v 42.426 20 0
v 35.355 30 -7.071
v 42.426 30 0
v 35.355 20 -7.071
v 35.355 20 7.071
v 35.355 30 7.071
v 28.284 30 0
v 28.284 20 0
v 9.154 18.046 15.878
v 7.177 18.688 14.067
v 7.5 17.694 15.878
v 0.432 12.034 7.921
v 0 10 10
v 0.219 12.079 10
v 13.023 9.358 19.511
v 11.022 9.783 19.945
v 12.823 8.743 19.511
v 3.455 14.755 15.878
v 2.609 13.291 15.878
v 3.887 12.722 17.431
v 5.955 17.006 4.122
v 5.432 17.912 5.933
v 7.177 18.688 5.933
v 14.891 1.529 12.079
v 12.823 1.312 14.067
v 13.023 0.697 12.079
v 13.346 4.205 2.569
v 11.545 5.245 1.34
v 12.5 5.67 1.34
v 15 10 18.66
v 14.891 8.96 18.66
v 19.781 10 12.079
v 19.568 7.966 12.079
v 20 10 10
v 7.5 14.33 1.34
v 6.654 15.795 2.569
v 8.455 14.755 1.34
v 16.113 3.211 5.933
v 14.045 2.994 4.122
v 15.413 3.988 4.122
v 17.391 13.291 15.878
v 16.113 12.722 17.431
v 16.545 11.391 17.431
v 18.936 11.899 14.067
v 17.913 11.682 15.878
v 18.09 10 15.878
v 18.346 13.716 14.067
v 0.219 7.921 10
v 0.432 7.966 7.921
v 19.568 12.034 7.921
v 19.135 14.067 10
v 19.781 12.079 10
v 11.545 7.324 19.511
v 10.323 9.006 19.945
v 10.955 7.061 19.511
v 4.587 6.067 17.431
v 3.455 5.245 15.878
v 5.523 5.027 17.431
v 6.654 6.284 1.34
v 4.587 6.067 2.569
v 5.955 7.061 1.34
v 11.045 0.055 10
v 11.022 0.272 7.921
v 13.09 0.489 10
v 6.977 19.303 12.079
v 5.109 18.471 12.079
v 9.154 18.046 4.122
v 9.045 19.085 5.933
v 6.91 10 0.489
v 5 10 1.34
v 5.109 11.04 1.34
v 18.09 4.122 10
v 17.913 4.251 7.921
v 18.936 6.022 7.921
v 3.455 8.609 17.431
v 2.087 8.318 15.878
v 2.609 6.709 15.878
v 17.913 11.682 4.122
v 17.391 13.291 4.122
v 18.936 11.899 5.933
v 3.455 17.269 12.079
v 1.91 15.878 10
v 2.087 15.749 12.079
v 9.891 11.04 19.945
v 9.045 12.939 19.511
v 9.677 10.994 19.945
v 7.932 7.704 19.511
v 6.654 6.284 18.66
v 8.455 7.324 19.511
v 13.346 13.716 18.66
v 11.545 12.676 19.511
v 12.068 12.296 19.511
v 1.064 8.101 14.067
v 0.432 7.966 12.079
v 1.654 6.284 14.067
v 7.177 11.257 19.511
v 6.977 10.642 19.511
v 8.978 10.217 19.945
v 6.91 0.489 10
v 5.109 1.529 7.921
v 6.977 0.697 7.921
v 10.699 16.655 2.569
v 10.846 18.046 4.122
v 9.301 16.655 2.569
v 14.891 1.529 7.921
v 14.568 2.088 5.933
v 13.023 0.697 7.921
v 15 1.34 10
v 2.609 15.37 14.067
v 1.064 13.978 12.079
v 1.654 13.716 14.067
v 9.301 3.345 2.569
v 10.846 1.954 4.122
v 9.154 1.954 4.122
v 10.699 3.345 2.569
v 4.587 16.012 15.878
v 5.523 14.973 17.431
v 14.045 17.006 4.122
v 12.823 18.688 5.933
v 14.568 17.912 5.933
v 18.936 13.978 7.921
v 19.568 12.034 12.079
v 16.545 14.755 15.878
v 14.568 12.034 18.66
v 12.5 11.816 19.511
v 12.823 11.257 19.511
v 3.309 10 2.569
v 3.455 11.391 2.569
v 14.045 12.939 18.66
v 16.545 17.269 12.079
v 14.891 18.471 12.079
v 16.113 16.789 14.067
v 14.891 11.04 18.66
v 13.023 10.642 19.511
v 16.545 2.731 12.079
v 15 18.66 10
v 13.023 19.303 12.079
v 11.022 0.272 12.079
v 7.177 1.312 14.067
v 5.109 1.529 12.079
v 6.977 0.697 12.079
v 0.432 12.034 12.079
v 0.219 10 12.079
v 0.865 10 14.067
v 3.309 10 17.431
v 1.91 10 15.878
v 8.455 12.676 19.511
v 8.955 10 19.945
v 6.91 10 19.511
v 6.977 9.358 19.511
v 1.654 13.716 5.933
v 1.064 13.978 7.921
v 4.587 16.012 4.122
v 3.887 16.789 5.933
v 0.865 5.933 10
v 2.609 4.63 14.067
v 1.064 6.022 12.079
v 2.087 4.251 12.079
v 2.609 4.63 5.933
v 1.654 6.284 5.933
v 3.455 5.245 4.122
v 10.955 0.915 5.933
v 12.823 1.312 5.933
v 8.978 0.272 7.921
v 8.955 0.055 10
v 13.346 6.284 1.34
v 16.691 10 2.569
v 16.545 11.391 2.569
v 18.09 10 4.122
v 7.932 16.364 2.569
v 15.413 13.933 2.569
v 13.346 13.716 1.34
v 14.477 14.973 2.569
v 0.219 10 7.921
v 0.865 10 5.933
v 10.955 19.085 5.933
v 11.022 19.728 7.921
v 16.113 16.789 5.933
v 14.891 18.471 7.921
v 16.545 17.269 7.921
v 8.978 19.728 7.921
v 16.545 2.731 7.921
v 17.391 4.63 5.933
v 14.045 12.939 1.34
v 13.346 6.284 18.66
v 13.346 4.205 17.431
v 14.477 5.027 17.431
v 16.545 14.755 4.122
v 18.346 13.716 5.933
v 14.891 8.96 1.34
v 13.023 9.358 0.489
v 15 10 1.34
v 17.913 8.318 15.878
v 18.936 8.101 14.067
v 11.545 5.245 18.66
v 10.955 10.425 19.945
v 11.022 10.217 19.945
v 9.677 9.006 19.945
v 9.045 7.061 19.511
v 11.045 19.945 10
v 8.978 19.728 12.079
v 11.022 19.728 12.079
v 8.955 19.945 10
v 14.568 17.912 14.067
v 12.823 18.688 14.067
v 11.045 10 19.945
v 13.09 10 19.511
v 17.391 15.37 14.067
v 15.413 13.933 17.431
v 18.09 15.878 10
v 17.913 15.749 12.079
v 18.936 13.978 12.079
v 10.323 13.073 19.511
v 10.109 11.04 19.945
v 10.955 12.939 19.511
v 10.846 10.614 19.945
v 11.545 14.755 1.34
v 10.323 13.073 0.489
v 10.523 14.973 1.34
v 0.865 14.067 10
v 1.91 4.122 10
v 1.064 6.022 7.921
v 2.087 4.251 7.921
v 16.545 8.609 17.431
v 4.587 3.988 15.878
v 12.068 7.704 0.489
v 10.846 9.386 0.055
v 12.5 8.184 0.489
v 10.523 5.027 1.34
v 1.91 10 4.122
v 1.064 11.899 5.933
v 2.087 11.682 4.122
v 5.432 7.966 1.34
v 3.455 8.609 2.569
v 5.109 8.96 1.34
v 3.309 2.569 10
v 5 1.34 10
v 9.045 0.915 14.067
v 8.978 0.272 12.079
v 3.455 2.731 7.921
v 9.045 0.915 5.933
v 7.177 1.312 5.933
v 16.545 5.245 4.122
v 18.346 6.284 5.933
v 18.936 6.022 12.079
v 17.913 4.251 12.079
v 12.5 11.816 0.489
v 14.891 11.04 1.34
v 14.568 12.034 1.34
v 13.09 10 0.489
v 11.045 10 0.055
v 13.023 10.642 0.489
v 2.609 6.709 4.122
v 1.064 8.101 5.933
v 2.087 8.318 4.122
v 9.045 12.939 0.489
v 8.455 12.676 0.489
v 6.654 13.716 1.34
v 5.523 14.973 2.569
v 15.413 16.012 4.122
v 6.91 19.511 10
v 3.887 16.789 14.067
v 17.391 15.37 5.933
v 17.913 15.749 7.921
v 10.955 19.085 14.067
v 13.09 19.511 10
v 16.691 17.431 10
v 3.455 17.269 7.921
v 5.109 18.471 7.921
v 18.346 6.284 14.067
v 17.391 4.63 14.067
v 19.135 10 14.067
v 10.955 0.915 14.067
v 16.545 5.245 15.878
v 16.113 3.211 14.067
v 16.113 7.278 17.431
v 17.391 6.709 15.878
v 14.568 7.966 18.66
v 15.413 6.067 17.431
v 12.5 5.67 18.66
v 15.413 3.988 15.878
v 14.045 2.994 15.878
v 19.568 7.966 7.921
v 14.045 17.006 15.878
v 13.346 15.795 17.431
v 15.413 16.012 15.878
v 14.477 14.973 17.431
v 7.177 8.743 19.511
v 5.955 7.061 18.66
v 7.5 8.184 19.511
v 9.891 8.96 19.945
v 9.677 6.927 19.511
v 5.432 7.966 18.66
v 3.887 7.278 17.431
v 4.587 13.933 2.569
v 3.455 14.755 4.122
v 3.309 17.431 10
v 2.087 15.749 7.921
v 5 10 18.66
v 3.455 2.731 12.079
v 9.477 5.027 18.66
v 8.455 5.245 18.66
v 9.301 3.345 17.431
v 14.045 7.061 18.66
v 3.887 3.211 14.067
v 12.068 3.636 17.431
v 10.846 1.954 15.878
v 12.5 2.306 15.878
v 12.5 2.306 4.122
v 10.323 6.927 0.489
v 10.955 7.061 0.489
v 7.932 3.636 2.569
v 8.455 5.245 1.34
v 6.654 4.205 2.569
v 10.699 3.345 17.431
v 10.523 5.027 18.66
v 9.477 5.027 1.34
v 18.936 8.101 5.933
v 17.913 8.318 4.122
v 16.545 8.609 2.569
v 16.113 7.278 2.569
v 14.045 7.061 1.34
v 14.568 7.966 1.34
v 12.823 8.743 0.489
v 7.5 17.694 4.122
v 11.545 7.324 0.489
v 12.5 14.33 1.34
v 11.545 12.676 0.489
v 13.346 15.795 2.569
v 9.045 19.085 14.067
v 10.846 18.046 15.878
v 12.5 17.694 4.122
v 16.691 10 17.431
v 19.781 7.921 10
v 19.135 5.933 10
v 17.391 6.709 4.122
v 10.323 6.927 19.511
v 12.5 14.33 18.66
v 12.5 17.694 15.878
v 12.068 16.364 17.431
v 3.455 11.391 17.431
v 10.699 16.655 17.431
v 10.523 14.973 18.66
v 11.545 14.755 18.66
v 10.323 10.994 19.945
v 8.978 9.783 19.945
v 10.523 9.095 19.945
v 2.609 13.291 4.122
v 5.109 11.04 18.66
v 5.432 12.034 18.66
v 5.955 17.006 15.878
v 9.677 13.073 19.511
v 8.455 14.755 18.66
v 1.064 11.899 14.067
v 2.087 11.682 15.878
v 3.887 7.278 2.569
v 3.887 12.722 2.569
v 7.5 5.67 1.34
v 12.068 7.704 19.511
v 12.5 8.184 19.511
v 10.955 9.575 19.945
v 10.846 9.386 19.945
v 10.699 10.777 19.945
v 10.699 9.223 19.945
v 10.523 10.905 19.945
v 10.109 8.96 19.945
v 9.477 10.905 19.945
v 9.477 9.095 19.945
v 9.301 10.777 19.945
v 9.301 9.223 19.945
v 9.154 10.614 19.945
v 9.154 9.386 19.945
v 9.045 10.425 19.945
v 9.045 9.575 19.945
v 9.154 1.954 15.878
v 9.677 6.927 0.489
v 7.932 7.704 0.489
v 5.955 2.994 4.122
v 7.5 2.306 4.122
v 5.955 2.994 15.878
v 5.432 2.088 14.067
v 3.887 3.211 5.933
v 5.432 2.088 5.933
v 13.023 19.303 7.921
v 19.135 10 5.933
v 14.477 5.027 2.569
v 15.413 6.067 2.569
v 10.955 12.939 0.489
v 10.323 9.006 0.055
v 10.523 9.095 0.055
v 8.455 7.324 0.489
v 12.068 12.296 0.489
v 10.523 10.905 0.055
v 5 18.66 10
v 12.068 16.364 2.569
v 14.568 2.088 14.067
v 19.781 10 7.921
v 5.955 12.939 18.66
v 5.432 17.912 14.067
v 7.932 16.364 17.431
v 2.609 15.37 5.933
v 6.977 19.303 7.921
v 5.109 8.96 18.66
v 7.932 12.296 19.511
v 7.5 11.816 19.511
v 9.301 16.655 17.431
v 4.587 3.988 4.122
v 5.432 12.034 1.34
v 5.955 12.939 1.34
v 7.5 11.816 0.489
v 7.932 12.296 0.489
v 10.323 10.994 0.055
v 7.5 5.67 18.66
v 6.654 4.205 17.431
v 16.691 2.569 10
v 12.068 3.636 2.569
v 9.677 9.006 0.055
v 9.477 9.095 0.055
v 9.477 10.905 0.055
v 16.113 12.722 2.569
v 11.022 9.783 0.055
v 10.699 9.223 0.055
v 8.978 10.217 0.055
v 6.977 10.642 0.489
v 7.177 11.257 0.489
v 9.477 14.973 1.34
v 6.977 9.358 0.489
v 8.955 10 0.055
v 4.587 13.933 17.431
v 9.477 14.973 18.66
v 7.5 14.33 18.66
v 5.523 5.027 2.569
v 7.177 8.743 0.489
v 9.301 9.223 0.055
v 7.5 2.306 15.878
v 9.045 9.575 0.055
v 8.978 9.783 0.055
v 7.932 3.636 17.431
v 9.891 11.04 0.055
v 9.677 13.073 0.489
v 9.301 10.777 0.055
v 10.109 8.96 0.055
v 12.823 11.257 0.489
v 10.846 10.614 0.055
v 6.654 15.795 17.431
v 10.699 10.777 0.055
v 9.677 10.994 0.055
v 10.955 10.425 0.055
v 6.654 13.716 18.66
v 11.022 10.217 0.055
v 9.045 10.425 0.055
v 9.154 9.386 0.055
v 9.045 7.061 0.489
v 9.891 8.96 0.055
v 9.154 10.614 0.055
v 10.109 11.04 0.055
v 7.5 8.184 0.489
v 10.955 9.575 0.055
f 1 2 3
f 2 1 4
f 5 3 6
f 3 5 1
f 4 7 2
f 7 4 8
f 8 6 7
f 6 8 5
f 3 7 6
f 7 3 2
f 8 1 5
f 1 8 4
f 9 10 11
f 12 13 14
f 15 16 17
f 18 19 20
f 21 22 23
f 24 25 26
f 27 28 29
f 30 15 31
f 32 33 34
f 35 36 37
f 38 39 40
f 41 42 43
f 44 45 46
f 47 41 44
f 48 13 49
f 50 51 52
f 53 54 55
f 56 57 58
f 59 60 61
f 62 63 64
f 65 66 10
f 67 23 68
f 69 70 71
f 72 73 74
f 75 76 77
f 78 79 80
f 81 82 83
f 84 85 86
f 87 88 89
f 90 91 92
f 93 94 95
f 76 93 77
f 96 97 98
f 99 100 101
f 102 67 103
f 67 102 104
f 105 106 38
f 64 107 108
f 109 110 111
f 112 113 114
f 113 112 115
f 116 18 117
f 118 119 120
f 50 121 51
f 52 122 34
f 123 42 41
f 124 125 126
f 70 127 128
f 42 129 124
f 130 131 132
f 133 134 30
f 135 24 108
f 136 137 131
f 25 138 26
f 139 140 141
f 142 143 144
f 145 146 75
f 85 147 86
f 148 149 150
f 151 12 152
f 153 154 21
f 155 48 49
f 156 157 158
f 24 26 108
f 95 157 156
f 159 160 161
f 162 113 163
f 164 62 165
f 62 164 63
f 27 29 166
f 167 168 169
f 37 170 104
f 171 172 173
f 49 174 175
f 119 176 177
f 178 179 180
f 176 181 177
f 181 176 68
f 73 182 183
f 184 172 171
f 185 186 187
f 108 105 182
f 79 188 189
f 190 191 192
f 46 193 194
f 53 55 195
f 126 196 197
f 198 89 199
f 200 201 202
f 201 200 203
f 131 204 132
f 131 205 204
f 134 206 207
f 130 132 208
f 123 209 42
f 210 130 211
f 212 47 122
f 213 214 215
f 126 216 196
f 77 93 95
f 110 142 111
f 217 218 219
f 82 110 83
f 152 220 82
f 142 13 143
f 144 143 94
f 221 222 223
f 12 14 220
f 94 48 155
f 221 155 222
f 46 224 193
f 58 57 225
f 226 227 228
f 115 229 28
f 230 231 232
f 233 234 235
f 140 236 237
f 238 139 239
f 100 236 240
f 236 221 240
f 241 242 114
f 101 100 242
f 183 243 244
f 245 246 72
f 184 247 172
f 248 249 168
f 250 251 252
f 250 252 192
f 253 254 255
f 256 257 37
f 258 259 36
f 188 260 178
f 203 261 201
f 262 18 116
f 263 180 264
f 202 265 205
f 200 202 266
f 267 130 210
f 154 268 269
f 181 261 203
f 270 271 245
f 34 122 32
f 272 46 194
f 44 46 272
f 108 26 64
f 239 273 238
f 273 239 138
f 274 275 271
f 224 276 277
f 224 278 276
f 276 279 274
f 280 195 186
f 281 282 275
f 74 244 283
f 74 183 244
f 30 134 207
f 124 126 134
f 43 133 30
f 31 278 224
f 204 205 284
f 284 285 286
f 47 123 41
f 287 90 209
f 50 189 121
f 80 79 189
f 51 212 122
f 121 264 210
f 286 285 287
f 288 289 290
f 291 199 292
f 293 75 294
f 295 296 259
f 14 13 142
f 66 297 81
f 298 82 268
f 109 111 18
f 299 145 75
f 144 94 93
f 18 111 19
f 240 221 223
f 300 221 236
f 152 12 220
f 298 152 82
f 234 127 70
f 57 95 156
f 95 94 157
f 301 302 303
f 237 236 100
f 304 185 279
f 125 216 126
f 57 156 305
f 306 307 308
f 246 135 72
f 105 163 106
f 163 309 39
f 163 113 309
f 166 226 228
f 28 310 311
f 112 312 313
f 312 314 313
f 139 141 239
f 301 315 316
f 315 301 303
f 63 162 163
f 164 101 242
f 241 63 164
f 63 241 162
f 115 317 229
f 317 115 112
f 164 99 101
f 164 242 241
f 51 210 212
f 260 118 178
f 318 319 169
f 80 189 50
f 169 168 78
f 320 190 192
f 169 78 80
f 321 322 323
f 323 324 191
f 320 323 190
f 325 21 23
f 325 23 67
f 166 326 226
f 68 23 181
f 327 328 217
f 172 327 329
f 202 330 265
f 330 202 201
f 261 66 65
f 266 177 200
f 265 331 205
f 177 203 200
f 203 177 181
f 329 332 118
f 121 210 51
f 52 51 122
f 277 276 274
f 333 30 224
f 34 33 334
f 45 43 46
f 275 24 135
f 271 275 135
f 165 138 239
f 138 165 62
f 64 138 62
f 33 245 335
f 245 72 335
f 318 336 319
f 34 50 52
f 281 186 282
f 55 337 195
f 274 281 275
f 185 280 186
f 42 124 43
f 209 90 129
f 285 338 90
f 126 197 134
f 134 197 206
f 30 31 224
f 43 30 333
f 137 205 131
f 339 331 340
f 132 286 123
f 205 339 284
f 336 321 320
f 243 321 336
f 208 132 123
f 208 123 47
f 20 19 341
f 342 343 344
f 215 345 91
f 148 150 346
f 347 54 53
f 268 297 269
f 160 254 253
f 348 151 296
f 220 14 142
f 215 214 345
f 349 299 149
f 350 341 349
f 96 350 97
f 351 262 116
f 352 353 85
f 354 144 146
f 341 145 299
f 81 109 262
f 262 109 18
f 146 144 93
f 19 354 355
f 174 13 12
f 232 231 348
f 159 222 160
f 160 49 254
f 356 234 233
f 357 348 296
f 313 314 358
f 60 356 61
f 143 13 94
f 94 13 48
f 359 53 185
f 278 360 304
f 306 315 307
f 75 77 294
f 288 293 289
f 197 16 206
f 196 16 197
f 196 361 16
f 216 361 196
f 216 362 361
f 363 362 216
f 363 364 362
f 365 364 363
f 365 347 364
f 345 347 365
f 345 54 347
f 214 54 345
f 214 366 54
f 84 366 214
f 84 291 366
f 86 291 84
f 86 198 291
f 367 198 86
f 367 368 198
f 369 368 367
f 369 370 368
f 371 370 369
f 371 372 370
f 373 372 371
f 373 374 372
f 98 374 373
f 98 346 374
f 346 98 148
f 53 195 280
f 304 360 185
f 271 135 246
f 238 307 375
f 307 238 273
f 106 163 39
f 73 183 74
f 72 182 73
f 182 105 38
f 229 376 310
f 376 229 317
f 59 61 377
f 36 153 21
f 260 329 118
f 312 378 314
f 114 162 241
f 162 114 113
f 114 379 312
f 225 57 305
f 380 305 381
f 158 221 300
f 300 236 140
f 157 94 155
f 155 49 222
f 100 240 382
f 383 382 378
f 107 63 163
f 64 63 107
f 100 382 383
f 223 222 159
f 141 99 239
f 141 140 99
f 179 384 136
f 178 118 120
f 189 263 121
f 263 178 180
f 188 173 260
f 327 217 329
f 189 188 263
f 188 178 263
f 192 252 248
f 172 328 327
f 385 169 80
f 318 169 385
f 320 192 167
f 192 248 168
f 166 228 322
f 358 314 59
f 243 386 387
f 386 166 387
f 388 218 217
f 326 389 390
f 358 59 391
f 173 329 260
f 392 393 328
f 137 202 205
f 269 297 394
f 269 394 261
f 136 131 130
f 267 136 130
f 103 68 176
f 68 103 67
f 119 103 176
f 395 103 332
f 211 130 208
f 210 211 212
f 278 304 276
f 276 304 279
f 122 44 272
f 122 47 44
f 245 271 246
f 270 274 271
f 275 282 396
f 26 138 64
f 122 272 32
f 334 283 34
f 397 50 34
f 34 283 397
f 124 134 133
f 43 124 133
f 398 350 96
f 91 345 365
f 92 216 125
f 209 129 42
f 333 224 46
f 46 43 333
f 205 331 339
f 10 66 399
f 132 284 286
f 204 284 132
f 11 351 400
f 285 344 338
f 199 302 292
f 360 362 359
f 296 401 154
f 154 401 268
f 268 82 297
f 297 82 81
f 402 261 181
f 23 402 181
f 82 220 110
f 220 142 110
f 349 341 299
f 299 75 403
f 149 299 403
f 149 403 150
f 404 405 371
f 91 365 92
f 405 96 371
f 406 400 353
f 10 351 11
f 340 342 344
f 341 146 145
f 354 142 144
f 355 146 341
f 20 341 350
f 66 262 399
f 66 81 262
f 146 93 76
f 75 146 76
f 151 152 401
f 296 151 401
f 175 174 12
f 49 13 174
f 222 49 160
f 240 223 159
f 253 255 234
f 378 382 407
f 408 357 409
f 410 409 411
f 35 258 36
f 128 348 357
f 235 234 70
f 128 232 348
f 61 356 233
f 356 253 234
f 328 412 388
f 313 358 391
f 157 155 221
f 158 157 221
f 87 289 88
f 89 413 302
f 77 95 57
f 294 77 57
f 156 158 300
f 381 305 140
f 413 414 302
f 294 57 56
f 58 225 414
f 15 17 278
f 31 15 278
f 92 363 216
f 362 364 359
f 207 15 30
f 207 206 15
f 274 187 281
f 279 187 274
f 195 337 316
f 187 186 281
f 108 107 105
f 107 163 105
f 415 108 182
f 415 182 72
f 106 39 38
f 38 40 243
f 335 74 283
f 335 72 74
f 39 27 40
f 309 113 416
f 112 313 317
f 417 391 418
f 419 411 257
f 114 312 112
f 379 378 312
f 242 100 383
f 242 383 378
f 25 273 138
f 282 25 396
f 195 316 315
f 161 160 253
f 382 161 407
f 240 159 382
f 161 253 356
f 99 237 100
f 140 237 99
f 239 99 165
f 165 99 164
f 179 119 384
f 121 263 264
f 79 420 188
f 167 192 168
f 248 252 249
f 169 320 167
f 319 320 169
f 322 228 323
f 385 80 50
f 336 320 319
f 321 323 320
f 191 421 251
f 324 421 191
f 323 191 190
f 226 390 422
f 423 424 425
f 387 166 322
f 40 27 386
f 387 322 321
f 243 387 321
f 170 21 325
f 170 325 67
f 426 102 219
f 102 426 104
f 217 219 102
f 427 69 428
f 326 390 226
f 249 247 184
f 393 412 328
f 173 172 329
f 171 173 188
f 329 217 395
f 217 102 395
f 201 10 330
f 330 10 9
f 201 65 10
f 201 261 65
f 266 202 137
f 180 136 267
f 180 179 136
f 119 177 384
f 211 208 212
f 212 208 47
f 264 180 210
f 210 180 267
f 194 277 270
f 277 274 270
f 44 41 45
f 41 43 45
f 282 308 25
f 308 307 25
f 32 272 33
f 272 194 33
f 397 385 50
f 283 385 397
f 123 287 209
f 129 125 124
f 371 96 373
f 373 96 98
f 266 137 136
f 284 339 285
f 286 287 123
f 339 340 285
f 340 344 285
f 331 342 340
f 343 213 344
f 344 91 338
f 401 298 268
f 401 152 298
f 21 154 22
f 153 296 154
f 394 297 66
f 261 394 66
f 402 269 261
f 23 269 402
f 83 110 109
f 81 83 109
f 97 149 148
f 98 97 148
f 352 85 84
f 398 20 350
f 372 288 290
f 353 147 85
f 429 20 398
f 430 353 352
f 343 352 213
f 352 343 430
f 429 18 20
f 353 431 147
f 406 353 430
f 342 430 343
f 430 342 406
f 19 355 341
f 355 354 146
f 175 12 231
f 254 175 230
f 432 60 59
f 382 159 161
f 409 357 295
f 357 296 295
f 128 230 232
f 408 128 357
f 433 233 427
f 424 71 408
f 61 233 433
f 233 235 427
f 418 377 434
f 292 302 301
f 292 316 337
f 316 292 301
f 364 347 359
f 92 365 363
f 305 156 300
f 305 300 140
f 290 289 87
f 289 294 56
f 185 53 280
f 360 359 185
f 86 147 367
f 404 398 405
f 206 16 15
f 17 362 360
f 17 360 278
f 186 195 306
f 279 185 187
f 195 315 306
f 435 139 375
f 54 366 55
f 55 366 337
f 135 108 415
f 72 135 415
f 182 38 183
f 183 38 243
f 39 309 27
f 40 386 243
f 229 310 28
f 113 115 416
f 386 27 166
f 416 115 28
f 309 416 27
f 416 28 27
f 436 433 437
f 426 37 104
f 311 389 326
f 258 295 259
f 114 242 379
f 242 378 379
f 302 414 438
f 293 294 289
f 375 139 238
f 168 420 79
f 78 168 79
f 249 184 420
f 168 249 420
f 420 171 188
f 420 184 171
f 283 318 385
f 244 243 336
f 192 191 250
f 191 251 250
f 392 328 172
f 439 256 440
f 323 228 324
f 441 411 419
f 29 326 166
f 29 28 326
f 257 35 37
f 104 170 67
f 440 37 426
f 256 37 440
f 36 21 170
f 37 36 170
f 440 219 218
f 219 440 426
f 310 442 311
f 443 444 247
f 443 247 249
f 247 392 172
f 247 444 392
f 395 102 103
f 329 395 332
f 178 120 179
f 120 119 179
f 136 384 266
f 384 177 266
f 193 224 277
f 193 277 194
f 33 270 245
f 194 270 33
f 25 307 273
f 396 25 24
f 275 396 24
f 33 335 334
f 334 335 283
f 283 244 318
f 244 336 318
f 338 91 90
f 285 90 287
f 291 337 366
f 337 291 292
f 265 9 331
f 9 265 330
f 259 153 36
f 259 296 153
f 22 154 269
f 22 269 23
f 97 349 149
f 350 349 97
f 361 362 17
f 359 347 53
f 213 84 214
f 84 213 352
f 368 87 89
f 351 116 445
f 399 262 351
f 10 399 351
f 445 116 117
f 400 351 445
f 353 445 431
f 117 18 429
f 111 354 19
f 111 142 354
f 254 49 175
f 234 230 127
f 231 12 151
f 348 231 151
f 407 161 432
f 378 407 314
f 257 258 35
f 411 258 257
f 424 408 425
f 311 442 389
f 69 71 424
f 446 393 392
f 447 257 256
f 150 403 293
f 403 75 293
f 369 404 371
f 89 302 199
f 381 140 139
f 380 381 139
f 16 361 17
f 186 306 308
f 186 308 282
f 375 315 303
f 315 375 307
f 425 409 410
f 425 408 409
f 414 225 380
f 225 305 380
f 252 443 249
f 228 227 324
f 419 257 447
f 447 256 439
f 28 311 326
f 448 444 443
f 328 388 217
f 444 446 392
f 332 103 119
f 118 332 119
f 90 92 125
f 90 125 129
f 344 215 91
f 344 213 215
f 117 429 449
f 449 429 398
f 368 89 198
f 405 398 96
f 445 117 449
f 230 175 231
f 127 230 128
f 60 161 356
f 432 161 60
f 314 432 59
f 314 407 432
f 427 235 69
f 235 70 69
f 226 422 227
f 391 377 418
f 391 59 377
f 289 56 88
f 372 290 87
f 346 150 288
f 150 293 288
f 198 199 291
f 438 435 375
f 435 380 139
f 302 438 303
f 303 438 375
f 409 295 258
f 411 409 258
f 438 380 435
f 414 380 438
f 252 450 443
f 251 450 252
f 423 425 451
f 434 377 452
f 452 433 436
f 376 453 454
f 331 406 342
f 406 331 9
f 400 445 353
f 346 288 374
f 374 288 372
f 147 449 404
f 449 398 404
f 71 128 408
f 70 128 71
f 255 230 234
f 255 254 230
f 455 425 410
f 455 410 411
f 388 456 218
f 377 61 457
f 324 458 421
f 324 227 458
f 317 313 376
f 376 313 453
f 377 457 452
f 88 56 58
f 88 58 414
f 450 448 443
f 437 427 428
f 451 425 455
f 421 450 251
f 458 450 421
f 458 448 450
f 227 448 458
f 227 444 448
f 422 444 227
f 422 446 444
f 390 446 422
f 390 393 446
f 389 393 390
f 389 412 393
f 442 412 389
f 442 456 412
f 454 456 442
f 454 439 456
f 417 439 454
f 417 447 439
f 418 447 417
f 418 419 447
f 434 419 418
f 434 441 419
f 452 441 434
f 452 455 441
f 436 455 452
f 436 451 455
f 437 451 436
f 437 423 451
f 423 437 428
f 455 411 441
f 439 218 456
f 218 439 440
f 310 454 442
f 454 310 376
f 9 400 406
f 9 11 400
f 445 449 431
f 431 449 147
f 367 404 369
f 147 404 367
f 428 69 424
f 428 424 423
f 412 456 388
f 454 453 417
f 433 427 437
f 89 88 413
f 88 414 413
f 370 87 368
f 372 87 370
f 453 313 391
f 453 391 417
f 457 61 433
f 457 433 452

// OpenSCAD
render()
    color("red")
rotate([0, 45, 0])
                translate([20, 20, 20])
                cube([10, 10, 10]);

translate([10, 10, 10]) {
    color("green")
sphere(r = 10);
}
